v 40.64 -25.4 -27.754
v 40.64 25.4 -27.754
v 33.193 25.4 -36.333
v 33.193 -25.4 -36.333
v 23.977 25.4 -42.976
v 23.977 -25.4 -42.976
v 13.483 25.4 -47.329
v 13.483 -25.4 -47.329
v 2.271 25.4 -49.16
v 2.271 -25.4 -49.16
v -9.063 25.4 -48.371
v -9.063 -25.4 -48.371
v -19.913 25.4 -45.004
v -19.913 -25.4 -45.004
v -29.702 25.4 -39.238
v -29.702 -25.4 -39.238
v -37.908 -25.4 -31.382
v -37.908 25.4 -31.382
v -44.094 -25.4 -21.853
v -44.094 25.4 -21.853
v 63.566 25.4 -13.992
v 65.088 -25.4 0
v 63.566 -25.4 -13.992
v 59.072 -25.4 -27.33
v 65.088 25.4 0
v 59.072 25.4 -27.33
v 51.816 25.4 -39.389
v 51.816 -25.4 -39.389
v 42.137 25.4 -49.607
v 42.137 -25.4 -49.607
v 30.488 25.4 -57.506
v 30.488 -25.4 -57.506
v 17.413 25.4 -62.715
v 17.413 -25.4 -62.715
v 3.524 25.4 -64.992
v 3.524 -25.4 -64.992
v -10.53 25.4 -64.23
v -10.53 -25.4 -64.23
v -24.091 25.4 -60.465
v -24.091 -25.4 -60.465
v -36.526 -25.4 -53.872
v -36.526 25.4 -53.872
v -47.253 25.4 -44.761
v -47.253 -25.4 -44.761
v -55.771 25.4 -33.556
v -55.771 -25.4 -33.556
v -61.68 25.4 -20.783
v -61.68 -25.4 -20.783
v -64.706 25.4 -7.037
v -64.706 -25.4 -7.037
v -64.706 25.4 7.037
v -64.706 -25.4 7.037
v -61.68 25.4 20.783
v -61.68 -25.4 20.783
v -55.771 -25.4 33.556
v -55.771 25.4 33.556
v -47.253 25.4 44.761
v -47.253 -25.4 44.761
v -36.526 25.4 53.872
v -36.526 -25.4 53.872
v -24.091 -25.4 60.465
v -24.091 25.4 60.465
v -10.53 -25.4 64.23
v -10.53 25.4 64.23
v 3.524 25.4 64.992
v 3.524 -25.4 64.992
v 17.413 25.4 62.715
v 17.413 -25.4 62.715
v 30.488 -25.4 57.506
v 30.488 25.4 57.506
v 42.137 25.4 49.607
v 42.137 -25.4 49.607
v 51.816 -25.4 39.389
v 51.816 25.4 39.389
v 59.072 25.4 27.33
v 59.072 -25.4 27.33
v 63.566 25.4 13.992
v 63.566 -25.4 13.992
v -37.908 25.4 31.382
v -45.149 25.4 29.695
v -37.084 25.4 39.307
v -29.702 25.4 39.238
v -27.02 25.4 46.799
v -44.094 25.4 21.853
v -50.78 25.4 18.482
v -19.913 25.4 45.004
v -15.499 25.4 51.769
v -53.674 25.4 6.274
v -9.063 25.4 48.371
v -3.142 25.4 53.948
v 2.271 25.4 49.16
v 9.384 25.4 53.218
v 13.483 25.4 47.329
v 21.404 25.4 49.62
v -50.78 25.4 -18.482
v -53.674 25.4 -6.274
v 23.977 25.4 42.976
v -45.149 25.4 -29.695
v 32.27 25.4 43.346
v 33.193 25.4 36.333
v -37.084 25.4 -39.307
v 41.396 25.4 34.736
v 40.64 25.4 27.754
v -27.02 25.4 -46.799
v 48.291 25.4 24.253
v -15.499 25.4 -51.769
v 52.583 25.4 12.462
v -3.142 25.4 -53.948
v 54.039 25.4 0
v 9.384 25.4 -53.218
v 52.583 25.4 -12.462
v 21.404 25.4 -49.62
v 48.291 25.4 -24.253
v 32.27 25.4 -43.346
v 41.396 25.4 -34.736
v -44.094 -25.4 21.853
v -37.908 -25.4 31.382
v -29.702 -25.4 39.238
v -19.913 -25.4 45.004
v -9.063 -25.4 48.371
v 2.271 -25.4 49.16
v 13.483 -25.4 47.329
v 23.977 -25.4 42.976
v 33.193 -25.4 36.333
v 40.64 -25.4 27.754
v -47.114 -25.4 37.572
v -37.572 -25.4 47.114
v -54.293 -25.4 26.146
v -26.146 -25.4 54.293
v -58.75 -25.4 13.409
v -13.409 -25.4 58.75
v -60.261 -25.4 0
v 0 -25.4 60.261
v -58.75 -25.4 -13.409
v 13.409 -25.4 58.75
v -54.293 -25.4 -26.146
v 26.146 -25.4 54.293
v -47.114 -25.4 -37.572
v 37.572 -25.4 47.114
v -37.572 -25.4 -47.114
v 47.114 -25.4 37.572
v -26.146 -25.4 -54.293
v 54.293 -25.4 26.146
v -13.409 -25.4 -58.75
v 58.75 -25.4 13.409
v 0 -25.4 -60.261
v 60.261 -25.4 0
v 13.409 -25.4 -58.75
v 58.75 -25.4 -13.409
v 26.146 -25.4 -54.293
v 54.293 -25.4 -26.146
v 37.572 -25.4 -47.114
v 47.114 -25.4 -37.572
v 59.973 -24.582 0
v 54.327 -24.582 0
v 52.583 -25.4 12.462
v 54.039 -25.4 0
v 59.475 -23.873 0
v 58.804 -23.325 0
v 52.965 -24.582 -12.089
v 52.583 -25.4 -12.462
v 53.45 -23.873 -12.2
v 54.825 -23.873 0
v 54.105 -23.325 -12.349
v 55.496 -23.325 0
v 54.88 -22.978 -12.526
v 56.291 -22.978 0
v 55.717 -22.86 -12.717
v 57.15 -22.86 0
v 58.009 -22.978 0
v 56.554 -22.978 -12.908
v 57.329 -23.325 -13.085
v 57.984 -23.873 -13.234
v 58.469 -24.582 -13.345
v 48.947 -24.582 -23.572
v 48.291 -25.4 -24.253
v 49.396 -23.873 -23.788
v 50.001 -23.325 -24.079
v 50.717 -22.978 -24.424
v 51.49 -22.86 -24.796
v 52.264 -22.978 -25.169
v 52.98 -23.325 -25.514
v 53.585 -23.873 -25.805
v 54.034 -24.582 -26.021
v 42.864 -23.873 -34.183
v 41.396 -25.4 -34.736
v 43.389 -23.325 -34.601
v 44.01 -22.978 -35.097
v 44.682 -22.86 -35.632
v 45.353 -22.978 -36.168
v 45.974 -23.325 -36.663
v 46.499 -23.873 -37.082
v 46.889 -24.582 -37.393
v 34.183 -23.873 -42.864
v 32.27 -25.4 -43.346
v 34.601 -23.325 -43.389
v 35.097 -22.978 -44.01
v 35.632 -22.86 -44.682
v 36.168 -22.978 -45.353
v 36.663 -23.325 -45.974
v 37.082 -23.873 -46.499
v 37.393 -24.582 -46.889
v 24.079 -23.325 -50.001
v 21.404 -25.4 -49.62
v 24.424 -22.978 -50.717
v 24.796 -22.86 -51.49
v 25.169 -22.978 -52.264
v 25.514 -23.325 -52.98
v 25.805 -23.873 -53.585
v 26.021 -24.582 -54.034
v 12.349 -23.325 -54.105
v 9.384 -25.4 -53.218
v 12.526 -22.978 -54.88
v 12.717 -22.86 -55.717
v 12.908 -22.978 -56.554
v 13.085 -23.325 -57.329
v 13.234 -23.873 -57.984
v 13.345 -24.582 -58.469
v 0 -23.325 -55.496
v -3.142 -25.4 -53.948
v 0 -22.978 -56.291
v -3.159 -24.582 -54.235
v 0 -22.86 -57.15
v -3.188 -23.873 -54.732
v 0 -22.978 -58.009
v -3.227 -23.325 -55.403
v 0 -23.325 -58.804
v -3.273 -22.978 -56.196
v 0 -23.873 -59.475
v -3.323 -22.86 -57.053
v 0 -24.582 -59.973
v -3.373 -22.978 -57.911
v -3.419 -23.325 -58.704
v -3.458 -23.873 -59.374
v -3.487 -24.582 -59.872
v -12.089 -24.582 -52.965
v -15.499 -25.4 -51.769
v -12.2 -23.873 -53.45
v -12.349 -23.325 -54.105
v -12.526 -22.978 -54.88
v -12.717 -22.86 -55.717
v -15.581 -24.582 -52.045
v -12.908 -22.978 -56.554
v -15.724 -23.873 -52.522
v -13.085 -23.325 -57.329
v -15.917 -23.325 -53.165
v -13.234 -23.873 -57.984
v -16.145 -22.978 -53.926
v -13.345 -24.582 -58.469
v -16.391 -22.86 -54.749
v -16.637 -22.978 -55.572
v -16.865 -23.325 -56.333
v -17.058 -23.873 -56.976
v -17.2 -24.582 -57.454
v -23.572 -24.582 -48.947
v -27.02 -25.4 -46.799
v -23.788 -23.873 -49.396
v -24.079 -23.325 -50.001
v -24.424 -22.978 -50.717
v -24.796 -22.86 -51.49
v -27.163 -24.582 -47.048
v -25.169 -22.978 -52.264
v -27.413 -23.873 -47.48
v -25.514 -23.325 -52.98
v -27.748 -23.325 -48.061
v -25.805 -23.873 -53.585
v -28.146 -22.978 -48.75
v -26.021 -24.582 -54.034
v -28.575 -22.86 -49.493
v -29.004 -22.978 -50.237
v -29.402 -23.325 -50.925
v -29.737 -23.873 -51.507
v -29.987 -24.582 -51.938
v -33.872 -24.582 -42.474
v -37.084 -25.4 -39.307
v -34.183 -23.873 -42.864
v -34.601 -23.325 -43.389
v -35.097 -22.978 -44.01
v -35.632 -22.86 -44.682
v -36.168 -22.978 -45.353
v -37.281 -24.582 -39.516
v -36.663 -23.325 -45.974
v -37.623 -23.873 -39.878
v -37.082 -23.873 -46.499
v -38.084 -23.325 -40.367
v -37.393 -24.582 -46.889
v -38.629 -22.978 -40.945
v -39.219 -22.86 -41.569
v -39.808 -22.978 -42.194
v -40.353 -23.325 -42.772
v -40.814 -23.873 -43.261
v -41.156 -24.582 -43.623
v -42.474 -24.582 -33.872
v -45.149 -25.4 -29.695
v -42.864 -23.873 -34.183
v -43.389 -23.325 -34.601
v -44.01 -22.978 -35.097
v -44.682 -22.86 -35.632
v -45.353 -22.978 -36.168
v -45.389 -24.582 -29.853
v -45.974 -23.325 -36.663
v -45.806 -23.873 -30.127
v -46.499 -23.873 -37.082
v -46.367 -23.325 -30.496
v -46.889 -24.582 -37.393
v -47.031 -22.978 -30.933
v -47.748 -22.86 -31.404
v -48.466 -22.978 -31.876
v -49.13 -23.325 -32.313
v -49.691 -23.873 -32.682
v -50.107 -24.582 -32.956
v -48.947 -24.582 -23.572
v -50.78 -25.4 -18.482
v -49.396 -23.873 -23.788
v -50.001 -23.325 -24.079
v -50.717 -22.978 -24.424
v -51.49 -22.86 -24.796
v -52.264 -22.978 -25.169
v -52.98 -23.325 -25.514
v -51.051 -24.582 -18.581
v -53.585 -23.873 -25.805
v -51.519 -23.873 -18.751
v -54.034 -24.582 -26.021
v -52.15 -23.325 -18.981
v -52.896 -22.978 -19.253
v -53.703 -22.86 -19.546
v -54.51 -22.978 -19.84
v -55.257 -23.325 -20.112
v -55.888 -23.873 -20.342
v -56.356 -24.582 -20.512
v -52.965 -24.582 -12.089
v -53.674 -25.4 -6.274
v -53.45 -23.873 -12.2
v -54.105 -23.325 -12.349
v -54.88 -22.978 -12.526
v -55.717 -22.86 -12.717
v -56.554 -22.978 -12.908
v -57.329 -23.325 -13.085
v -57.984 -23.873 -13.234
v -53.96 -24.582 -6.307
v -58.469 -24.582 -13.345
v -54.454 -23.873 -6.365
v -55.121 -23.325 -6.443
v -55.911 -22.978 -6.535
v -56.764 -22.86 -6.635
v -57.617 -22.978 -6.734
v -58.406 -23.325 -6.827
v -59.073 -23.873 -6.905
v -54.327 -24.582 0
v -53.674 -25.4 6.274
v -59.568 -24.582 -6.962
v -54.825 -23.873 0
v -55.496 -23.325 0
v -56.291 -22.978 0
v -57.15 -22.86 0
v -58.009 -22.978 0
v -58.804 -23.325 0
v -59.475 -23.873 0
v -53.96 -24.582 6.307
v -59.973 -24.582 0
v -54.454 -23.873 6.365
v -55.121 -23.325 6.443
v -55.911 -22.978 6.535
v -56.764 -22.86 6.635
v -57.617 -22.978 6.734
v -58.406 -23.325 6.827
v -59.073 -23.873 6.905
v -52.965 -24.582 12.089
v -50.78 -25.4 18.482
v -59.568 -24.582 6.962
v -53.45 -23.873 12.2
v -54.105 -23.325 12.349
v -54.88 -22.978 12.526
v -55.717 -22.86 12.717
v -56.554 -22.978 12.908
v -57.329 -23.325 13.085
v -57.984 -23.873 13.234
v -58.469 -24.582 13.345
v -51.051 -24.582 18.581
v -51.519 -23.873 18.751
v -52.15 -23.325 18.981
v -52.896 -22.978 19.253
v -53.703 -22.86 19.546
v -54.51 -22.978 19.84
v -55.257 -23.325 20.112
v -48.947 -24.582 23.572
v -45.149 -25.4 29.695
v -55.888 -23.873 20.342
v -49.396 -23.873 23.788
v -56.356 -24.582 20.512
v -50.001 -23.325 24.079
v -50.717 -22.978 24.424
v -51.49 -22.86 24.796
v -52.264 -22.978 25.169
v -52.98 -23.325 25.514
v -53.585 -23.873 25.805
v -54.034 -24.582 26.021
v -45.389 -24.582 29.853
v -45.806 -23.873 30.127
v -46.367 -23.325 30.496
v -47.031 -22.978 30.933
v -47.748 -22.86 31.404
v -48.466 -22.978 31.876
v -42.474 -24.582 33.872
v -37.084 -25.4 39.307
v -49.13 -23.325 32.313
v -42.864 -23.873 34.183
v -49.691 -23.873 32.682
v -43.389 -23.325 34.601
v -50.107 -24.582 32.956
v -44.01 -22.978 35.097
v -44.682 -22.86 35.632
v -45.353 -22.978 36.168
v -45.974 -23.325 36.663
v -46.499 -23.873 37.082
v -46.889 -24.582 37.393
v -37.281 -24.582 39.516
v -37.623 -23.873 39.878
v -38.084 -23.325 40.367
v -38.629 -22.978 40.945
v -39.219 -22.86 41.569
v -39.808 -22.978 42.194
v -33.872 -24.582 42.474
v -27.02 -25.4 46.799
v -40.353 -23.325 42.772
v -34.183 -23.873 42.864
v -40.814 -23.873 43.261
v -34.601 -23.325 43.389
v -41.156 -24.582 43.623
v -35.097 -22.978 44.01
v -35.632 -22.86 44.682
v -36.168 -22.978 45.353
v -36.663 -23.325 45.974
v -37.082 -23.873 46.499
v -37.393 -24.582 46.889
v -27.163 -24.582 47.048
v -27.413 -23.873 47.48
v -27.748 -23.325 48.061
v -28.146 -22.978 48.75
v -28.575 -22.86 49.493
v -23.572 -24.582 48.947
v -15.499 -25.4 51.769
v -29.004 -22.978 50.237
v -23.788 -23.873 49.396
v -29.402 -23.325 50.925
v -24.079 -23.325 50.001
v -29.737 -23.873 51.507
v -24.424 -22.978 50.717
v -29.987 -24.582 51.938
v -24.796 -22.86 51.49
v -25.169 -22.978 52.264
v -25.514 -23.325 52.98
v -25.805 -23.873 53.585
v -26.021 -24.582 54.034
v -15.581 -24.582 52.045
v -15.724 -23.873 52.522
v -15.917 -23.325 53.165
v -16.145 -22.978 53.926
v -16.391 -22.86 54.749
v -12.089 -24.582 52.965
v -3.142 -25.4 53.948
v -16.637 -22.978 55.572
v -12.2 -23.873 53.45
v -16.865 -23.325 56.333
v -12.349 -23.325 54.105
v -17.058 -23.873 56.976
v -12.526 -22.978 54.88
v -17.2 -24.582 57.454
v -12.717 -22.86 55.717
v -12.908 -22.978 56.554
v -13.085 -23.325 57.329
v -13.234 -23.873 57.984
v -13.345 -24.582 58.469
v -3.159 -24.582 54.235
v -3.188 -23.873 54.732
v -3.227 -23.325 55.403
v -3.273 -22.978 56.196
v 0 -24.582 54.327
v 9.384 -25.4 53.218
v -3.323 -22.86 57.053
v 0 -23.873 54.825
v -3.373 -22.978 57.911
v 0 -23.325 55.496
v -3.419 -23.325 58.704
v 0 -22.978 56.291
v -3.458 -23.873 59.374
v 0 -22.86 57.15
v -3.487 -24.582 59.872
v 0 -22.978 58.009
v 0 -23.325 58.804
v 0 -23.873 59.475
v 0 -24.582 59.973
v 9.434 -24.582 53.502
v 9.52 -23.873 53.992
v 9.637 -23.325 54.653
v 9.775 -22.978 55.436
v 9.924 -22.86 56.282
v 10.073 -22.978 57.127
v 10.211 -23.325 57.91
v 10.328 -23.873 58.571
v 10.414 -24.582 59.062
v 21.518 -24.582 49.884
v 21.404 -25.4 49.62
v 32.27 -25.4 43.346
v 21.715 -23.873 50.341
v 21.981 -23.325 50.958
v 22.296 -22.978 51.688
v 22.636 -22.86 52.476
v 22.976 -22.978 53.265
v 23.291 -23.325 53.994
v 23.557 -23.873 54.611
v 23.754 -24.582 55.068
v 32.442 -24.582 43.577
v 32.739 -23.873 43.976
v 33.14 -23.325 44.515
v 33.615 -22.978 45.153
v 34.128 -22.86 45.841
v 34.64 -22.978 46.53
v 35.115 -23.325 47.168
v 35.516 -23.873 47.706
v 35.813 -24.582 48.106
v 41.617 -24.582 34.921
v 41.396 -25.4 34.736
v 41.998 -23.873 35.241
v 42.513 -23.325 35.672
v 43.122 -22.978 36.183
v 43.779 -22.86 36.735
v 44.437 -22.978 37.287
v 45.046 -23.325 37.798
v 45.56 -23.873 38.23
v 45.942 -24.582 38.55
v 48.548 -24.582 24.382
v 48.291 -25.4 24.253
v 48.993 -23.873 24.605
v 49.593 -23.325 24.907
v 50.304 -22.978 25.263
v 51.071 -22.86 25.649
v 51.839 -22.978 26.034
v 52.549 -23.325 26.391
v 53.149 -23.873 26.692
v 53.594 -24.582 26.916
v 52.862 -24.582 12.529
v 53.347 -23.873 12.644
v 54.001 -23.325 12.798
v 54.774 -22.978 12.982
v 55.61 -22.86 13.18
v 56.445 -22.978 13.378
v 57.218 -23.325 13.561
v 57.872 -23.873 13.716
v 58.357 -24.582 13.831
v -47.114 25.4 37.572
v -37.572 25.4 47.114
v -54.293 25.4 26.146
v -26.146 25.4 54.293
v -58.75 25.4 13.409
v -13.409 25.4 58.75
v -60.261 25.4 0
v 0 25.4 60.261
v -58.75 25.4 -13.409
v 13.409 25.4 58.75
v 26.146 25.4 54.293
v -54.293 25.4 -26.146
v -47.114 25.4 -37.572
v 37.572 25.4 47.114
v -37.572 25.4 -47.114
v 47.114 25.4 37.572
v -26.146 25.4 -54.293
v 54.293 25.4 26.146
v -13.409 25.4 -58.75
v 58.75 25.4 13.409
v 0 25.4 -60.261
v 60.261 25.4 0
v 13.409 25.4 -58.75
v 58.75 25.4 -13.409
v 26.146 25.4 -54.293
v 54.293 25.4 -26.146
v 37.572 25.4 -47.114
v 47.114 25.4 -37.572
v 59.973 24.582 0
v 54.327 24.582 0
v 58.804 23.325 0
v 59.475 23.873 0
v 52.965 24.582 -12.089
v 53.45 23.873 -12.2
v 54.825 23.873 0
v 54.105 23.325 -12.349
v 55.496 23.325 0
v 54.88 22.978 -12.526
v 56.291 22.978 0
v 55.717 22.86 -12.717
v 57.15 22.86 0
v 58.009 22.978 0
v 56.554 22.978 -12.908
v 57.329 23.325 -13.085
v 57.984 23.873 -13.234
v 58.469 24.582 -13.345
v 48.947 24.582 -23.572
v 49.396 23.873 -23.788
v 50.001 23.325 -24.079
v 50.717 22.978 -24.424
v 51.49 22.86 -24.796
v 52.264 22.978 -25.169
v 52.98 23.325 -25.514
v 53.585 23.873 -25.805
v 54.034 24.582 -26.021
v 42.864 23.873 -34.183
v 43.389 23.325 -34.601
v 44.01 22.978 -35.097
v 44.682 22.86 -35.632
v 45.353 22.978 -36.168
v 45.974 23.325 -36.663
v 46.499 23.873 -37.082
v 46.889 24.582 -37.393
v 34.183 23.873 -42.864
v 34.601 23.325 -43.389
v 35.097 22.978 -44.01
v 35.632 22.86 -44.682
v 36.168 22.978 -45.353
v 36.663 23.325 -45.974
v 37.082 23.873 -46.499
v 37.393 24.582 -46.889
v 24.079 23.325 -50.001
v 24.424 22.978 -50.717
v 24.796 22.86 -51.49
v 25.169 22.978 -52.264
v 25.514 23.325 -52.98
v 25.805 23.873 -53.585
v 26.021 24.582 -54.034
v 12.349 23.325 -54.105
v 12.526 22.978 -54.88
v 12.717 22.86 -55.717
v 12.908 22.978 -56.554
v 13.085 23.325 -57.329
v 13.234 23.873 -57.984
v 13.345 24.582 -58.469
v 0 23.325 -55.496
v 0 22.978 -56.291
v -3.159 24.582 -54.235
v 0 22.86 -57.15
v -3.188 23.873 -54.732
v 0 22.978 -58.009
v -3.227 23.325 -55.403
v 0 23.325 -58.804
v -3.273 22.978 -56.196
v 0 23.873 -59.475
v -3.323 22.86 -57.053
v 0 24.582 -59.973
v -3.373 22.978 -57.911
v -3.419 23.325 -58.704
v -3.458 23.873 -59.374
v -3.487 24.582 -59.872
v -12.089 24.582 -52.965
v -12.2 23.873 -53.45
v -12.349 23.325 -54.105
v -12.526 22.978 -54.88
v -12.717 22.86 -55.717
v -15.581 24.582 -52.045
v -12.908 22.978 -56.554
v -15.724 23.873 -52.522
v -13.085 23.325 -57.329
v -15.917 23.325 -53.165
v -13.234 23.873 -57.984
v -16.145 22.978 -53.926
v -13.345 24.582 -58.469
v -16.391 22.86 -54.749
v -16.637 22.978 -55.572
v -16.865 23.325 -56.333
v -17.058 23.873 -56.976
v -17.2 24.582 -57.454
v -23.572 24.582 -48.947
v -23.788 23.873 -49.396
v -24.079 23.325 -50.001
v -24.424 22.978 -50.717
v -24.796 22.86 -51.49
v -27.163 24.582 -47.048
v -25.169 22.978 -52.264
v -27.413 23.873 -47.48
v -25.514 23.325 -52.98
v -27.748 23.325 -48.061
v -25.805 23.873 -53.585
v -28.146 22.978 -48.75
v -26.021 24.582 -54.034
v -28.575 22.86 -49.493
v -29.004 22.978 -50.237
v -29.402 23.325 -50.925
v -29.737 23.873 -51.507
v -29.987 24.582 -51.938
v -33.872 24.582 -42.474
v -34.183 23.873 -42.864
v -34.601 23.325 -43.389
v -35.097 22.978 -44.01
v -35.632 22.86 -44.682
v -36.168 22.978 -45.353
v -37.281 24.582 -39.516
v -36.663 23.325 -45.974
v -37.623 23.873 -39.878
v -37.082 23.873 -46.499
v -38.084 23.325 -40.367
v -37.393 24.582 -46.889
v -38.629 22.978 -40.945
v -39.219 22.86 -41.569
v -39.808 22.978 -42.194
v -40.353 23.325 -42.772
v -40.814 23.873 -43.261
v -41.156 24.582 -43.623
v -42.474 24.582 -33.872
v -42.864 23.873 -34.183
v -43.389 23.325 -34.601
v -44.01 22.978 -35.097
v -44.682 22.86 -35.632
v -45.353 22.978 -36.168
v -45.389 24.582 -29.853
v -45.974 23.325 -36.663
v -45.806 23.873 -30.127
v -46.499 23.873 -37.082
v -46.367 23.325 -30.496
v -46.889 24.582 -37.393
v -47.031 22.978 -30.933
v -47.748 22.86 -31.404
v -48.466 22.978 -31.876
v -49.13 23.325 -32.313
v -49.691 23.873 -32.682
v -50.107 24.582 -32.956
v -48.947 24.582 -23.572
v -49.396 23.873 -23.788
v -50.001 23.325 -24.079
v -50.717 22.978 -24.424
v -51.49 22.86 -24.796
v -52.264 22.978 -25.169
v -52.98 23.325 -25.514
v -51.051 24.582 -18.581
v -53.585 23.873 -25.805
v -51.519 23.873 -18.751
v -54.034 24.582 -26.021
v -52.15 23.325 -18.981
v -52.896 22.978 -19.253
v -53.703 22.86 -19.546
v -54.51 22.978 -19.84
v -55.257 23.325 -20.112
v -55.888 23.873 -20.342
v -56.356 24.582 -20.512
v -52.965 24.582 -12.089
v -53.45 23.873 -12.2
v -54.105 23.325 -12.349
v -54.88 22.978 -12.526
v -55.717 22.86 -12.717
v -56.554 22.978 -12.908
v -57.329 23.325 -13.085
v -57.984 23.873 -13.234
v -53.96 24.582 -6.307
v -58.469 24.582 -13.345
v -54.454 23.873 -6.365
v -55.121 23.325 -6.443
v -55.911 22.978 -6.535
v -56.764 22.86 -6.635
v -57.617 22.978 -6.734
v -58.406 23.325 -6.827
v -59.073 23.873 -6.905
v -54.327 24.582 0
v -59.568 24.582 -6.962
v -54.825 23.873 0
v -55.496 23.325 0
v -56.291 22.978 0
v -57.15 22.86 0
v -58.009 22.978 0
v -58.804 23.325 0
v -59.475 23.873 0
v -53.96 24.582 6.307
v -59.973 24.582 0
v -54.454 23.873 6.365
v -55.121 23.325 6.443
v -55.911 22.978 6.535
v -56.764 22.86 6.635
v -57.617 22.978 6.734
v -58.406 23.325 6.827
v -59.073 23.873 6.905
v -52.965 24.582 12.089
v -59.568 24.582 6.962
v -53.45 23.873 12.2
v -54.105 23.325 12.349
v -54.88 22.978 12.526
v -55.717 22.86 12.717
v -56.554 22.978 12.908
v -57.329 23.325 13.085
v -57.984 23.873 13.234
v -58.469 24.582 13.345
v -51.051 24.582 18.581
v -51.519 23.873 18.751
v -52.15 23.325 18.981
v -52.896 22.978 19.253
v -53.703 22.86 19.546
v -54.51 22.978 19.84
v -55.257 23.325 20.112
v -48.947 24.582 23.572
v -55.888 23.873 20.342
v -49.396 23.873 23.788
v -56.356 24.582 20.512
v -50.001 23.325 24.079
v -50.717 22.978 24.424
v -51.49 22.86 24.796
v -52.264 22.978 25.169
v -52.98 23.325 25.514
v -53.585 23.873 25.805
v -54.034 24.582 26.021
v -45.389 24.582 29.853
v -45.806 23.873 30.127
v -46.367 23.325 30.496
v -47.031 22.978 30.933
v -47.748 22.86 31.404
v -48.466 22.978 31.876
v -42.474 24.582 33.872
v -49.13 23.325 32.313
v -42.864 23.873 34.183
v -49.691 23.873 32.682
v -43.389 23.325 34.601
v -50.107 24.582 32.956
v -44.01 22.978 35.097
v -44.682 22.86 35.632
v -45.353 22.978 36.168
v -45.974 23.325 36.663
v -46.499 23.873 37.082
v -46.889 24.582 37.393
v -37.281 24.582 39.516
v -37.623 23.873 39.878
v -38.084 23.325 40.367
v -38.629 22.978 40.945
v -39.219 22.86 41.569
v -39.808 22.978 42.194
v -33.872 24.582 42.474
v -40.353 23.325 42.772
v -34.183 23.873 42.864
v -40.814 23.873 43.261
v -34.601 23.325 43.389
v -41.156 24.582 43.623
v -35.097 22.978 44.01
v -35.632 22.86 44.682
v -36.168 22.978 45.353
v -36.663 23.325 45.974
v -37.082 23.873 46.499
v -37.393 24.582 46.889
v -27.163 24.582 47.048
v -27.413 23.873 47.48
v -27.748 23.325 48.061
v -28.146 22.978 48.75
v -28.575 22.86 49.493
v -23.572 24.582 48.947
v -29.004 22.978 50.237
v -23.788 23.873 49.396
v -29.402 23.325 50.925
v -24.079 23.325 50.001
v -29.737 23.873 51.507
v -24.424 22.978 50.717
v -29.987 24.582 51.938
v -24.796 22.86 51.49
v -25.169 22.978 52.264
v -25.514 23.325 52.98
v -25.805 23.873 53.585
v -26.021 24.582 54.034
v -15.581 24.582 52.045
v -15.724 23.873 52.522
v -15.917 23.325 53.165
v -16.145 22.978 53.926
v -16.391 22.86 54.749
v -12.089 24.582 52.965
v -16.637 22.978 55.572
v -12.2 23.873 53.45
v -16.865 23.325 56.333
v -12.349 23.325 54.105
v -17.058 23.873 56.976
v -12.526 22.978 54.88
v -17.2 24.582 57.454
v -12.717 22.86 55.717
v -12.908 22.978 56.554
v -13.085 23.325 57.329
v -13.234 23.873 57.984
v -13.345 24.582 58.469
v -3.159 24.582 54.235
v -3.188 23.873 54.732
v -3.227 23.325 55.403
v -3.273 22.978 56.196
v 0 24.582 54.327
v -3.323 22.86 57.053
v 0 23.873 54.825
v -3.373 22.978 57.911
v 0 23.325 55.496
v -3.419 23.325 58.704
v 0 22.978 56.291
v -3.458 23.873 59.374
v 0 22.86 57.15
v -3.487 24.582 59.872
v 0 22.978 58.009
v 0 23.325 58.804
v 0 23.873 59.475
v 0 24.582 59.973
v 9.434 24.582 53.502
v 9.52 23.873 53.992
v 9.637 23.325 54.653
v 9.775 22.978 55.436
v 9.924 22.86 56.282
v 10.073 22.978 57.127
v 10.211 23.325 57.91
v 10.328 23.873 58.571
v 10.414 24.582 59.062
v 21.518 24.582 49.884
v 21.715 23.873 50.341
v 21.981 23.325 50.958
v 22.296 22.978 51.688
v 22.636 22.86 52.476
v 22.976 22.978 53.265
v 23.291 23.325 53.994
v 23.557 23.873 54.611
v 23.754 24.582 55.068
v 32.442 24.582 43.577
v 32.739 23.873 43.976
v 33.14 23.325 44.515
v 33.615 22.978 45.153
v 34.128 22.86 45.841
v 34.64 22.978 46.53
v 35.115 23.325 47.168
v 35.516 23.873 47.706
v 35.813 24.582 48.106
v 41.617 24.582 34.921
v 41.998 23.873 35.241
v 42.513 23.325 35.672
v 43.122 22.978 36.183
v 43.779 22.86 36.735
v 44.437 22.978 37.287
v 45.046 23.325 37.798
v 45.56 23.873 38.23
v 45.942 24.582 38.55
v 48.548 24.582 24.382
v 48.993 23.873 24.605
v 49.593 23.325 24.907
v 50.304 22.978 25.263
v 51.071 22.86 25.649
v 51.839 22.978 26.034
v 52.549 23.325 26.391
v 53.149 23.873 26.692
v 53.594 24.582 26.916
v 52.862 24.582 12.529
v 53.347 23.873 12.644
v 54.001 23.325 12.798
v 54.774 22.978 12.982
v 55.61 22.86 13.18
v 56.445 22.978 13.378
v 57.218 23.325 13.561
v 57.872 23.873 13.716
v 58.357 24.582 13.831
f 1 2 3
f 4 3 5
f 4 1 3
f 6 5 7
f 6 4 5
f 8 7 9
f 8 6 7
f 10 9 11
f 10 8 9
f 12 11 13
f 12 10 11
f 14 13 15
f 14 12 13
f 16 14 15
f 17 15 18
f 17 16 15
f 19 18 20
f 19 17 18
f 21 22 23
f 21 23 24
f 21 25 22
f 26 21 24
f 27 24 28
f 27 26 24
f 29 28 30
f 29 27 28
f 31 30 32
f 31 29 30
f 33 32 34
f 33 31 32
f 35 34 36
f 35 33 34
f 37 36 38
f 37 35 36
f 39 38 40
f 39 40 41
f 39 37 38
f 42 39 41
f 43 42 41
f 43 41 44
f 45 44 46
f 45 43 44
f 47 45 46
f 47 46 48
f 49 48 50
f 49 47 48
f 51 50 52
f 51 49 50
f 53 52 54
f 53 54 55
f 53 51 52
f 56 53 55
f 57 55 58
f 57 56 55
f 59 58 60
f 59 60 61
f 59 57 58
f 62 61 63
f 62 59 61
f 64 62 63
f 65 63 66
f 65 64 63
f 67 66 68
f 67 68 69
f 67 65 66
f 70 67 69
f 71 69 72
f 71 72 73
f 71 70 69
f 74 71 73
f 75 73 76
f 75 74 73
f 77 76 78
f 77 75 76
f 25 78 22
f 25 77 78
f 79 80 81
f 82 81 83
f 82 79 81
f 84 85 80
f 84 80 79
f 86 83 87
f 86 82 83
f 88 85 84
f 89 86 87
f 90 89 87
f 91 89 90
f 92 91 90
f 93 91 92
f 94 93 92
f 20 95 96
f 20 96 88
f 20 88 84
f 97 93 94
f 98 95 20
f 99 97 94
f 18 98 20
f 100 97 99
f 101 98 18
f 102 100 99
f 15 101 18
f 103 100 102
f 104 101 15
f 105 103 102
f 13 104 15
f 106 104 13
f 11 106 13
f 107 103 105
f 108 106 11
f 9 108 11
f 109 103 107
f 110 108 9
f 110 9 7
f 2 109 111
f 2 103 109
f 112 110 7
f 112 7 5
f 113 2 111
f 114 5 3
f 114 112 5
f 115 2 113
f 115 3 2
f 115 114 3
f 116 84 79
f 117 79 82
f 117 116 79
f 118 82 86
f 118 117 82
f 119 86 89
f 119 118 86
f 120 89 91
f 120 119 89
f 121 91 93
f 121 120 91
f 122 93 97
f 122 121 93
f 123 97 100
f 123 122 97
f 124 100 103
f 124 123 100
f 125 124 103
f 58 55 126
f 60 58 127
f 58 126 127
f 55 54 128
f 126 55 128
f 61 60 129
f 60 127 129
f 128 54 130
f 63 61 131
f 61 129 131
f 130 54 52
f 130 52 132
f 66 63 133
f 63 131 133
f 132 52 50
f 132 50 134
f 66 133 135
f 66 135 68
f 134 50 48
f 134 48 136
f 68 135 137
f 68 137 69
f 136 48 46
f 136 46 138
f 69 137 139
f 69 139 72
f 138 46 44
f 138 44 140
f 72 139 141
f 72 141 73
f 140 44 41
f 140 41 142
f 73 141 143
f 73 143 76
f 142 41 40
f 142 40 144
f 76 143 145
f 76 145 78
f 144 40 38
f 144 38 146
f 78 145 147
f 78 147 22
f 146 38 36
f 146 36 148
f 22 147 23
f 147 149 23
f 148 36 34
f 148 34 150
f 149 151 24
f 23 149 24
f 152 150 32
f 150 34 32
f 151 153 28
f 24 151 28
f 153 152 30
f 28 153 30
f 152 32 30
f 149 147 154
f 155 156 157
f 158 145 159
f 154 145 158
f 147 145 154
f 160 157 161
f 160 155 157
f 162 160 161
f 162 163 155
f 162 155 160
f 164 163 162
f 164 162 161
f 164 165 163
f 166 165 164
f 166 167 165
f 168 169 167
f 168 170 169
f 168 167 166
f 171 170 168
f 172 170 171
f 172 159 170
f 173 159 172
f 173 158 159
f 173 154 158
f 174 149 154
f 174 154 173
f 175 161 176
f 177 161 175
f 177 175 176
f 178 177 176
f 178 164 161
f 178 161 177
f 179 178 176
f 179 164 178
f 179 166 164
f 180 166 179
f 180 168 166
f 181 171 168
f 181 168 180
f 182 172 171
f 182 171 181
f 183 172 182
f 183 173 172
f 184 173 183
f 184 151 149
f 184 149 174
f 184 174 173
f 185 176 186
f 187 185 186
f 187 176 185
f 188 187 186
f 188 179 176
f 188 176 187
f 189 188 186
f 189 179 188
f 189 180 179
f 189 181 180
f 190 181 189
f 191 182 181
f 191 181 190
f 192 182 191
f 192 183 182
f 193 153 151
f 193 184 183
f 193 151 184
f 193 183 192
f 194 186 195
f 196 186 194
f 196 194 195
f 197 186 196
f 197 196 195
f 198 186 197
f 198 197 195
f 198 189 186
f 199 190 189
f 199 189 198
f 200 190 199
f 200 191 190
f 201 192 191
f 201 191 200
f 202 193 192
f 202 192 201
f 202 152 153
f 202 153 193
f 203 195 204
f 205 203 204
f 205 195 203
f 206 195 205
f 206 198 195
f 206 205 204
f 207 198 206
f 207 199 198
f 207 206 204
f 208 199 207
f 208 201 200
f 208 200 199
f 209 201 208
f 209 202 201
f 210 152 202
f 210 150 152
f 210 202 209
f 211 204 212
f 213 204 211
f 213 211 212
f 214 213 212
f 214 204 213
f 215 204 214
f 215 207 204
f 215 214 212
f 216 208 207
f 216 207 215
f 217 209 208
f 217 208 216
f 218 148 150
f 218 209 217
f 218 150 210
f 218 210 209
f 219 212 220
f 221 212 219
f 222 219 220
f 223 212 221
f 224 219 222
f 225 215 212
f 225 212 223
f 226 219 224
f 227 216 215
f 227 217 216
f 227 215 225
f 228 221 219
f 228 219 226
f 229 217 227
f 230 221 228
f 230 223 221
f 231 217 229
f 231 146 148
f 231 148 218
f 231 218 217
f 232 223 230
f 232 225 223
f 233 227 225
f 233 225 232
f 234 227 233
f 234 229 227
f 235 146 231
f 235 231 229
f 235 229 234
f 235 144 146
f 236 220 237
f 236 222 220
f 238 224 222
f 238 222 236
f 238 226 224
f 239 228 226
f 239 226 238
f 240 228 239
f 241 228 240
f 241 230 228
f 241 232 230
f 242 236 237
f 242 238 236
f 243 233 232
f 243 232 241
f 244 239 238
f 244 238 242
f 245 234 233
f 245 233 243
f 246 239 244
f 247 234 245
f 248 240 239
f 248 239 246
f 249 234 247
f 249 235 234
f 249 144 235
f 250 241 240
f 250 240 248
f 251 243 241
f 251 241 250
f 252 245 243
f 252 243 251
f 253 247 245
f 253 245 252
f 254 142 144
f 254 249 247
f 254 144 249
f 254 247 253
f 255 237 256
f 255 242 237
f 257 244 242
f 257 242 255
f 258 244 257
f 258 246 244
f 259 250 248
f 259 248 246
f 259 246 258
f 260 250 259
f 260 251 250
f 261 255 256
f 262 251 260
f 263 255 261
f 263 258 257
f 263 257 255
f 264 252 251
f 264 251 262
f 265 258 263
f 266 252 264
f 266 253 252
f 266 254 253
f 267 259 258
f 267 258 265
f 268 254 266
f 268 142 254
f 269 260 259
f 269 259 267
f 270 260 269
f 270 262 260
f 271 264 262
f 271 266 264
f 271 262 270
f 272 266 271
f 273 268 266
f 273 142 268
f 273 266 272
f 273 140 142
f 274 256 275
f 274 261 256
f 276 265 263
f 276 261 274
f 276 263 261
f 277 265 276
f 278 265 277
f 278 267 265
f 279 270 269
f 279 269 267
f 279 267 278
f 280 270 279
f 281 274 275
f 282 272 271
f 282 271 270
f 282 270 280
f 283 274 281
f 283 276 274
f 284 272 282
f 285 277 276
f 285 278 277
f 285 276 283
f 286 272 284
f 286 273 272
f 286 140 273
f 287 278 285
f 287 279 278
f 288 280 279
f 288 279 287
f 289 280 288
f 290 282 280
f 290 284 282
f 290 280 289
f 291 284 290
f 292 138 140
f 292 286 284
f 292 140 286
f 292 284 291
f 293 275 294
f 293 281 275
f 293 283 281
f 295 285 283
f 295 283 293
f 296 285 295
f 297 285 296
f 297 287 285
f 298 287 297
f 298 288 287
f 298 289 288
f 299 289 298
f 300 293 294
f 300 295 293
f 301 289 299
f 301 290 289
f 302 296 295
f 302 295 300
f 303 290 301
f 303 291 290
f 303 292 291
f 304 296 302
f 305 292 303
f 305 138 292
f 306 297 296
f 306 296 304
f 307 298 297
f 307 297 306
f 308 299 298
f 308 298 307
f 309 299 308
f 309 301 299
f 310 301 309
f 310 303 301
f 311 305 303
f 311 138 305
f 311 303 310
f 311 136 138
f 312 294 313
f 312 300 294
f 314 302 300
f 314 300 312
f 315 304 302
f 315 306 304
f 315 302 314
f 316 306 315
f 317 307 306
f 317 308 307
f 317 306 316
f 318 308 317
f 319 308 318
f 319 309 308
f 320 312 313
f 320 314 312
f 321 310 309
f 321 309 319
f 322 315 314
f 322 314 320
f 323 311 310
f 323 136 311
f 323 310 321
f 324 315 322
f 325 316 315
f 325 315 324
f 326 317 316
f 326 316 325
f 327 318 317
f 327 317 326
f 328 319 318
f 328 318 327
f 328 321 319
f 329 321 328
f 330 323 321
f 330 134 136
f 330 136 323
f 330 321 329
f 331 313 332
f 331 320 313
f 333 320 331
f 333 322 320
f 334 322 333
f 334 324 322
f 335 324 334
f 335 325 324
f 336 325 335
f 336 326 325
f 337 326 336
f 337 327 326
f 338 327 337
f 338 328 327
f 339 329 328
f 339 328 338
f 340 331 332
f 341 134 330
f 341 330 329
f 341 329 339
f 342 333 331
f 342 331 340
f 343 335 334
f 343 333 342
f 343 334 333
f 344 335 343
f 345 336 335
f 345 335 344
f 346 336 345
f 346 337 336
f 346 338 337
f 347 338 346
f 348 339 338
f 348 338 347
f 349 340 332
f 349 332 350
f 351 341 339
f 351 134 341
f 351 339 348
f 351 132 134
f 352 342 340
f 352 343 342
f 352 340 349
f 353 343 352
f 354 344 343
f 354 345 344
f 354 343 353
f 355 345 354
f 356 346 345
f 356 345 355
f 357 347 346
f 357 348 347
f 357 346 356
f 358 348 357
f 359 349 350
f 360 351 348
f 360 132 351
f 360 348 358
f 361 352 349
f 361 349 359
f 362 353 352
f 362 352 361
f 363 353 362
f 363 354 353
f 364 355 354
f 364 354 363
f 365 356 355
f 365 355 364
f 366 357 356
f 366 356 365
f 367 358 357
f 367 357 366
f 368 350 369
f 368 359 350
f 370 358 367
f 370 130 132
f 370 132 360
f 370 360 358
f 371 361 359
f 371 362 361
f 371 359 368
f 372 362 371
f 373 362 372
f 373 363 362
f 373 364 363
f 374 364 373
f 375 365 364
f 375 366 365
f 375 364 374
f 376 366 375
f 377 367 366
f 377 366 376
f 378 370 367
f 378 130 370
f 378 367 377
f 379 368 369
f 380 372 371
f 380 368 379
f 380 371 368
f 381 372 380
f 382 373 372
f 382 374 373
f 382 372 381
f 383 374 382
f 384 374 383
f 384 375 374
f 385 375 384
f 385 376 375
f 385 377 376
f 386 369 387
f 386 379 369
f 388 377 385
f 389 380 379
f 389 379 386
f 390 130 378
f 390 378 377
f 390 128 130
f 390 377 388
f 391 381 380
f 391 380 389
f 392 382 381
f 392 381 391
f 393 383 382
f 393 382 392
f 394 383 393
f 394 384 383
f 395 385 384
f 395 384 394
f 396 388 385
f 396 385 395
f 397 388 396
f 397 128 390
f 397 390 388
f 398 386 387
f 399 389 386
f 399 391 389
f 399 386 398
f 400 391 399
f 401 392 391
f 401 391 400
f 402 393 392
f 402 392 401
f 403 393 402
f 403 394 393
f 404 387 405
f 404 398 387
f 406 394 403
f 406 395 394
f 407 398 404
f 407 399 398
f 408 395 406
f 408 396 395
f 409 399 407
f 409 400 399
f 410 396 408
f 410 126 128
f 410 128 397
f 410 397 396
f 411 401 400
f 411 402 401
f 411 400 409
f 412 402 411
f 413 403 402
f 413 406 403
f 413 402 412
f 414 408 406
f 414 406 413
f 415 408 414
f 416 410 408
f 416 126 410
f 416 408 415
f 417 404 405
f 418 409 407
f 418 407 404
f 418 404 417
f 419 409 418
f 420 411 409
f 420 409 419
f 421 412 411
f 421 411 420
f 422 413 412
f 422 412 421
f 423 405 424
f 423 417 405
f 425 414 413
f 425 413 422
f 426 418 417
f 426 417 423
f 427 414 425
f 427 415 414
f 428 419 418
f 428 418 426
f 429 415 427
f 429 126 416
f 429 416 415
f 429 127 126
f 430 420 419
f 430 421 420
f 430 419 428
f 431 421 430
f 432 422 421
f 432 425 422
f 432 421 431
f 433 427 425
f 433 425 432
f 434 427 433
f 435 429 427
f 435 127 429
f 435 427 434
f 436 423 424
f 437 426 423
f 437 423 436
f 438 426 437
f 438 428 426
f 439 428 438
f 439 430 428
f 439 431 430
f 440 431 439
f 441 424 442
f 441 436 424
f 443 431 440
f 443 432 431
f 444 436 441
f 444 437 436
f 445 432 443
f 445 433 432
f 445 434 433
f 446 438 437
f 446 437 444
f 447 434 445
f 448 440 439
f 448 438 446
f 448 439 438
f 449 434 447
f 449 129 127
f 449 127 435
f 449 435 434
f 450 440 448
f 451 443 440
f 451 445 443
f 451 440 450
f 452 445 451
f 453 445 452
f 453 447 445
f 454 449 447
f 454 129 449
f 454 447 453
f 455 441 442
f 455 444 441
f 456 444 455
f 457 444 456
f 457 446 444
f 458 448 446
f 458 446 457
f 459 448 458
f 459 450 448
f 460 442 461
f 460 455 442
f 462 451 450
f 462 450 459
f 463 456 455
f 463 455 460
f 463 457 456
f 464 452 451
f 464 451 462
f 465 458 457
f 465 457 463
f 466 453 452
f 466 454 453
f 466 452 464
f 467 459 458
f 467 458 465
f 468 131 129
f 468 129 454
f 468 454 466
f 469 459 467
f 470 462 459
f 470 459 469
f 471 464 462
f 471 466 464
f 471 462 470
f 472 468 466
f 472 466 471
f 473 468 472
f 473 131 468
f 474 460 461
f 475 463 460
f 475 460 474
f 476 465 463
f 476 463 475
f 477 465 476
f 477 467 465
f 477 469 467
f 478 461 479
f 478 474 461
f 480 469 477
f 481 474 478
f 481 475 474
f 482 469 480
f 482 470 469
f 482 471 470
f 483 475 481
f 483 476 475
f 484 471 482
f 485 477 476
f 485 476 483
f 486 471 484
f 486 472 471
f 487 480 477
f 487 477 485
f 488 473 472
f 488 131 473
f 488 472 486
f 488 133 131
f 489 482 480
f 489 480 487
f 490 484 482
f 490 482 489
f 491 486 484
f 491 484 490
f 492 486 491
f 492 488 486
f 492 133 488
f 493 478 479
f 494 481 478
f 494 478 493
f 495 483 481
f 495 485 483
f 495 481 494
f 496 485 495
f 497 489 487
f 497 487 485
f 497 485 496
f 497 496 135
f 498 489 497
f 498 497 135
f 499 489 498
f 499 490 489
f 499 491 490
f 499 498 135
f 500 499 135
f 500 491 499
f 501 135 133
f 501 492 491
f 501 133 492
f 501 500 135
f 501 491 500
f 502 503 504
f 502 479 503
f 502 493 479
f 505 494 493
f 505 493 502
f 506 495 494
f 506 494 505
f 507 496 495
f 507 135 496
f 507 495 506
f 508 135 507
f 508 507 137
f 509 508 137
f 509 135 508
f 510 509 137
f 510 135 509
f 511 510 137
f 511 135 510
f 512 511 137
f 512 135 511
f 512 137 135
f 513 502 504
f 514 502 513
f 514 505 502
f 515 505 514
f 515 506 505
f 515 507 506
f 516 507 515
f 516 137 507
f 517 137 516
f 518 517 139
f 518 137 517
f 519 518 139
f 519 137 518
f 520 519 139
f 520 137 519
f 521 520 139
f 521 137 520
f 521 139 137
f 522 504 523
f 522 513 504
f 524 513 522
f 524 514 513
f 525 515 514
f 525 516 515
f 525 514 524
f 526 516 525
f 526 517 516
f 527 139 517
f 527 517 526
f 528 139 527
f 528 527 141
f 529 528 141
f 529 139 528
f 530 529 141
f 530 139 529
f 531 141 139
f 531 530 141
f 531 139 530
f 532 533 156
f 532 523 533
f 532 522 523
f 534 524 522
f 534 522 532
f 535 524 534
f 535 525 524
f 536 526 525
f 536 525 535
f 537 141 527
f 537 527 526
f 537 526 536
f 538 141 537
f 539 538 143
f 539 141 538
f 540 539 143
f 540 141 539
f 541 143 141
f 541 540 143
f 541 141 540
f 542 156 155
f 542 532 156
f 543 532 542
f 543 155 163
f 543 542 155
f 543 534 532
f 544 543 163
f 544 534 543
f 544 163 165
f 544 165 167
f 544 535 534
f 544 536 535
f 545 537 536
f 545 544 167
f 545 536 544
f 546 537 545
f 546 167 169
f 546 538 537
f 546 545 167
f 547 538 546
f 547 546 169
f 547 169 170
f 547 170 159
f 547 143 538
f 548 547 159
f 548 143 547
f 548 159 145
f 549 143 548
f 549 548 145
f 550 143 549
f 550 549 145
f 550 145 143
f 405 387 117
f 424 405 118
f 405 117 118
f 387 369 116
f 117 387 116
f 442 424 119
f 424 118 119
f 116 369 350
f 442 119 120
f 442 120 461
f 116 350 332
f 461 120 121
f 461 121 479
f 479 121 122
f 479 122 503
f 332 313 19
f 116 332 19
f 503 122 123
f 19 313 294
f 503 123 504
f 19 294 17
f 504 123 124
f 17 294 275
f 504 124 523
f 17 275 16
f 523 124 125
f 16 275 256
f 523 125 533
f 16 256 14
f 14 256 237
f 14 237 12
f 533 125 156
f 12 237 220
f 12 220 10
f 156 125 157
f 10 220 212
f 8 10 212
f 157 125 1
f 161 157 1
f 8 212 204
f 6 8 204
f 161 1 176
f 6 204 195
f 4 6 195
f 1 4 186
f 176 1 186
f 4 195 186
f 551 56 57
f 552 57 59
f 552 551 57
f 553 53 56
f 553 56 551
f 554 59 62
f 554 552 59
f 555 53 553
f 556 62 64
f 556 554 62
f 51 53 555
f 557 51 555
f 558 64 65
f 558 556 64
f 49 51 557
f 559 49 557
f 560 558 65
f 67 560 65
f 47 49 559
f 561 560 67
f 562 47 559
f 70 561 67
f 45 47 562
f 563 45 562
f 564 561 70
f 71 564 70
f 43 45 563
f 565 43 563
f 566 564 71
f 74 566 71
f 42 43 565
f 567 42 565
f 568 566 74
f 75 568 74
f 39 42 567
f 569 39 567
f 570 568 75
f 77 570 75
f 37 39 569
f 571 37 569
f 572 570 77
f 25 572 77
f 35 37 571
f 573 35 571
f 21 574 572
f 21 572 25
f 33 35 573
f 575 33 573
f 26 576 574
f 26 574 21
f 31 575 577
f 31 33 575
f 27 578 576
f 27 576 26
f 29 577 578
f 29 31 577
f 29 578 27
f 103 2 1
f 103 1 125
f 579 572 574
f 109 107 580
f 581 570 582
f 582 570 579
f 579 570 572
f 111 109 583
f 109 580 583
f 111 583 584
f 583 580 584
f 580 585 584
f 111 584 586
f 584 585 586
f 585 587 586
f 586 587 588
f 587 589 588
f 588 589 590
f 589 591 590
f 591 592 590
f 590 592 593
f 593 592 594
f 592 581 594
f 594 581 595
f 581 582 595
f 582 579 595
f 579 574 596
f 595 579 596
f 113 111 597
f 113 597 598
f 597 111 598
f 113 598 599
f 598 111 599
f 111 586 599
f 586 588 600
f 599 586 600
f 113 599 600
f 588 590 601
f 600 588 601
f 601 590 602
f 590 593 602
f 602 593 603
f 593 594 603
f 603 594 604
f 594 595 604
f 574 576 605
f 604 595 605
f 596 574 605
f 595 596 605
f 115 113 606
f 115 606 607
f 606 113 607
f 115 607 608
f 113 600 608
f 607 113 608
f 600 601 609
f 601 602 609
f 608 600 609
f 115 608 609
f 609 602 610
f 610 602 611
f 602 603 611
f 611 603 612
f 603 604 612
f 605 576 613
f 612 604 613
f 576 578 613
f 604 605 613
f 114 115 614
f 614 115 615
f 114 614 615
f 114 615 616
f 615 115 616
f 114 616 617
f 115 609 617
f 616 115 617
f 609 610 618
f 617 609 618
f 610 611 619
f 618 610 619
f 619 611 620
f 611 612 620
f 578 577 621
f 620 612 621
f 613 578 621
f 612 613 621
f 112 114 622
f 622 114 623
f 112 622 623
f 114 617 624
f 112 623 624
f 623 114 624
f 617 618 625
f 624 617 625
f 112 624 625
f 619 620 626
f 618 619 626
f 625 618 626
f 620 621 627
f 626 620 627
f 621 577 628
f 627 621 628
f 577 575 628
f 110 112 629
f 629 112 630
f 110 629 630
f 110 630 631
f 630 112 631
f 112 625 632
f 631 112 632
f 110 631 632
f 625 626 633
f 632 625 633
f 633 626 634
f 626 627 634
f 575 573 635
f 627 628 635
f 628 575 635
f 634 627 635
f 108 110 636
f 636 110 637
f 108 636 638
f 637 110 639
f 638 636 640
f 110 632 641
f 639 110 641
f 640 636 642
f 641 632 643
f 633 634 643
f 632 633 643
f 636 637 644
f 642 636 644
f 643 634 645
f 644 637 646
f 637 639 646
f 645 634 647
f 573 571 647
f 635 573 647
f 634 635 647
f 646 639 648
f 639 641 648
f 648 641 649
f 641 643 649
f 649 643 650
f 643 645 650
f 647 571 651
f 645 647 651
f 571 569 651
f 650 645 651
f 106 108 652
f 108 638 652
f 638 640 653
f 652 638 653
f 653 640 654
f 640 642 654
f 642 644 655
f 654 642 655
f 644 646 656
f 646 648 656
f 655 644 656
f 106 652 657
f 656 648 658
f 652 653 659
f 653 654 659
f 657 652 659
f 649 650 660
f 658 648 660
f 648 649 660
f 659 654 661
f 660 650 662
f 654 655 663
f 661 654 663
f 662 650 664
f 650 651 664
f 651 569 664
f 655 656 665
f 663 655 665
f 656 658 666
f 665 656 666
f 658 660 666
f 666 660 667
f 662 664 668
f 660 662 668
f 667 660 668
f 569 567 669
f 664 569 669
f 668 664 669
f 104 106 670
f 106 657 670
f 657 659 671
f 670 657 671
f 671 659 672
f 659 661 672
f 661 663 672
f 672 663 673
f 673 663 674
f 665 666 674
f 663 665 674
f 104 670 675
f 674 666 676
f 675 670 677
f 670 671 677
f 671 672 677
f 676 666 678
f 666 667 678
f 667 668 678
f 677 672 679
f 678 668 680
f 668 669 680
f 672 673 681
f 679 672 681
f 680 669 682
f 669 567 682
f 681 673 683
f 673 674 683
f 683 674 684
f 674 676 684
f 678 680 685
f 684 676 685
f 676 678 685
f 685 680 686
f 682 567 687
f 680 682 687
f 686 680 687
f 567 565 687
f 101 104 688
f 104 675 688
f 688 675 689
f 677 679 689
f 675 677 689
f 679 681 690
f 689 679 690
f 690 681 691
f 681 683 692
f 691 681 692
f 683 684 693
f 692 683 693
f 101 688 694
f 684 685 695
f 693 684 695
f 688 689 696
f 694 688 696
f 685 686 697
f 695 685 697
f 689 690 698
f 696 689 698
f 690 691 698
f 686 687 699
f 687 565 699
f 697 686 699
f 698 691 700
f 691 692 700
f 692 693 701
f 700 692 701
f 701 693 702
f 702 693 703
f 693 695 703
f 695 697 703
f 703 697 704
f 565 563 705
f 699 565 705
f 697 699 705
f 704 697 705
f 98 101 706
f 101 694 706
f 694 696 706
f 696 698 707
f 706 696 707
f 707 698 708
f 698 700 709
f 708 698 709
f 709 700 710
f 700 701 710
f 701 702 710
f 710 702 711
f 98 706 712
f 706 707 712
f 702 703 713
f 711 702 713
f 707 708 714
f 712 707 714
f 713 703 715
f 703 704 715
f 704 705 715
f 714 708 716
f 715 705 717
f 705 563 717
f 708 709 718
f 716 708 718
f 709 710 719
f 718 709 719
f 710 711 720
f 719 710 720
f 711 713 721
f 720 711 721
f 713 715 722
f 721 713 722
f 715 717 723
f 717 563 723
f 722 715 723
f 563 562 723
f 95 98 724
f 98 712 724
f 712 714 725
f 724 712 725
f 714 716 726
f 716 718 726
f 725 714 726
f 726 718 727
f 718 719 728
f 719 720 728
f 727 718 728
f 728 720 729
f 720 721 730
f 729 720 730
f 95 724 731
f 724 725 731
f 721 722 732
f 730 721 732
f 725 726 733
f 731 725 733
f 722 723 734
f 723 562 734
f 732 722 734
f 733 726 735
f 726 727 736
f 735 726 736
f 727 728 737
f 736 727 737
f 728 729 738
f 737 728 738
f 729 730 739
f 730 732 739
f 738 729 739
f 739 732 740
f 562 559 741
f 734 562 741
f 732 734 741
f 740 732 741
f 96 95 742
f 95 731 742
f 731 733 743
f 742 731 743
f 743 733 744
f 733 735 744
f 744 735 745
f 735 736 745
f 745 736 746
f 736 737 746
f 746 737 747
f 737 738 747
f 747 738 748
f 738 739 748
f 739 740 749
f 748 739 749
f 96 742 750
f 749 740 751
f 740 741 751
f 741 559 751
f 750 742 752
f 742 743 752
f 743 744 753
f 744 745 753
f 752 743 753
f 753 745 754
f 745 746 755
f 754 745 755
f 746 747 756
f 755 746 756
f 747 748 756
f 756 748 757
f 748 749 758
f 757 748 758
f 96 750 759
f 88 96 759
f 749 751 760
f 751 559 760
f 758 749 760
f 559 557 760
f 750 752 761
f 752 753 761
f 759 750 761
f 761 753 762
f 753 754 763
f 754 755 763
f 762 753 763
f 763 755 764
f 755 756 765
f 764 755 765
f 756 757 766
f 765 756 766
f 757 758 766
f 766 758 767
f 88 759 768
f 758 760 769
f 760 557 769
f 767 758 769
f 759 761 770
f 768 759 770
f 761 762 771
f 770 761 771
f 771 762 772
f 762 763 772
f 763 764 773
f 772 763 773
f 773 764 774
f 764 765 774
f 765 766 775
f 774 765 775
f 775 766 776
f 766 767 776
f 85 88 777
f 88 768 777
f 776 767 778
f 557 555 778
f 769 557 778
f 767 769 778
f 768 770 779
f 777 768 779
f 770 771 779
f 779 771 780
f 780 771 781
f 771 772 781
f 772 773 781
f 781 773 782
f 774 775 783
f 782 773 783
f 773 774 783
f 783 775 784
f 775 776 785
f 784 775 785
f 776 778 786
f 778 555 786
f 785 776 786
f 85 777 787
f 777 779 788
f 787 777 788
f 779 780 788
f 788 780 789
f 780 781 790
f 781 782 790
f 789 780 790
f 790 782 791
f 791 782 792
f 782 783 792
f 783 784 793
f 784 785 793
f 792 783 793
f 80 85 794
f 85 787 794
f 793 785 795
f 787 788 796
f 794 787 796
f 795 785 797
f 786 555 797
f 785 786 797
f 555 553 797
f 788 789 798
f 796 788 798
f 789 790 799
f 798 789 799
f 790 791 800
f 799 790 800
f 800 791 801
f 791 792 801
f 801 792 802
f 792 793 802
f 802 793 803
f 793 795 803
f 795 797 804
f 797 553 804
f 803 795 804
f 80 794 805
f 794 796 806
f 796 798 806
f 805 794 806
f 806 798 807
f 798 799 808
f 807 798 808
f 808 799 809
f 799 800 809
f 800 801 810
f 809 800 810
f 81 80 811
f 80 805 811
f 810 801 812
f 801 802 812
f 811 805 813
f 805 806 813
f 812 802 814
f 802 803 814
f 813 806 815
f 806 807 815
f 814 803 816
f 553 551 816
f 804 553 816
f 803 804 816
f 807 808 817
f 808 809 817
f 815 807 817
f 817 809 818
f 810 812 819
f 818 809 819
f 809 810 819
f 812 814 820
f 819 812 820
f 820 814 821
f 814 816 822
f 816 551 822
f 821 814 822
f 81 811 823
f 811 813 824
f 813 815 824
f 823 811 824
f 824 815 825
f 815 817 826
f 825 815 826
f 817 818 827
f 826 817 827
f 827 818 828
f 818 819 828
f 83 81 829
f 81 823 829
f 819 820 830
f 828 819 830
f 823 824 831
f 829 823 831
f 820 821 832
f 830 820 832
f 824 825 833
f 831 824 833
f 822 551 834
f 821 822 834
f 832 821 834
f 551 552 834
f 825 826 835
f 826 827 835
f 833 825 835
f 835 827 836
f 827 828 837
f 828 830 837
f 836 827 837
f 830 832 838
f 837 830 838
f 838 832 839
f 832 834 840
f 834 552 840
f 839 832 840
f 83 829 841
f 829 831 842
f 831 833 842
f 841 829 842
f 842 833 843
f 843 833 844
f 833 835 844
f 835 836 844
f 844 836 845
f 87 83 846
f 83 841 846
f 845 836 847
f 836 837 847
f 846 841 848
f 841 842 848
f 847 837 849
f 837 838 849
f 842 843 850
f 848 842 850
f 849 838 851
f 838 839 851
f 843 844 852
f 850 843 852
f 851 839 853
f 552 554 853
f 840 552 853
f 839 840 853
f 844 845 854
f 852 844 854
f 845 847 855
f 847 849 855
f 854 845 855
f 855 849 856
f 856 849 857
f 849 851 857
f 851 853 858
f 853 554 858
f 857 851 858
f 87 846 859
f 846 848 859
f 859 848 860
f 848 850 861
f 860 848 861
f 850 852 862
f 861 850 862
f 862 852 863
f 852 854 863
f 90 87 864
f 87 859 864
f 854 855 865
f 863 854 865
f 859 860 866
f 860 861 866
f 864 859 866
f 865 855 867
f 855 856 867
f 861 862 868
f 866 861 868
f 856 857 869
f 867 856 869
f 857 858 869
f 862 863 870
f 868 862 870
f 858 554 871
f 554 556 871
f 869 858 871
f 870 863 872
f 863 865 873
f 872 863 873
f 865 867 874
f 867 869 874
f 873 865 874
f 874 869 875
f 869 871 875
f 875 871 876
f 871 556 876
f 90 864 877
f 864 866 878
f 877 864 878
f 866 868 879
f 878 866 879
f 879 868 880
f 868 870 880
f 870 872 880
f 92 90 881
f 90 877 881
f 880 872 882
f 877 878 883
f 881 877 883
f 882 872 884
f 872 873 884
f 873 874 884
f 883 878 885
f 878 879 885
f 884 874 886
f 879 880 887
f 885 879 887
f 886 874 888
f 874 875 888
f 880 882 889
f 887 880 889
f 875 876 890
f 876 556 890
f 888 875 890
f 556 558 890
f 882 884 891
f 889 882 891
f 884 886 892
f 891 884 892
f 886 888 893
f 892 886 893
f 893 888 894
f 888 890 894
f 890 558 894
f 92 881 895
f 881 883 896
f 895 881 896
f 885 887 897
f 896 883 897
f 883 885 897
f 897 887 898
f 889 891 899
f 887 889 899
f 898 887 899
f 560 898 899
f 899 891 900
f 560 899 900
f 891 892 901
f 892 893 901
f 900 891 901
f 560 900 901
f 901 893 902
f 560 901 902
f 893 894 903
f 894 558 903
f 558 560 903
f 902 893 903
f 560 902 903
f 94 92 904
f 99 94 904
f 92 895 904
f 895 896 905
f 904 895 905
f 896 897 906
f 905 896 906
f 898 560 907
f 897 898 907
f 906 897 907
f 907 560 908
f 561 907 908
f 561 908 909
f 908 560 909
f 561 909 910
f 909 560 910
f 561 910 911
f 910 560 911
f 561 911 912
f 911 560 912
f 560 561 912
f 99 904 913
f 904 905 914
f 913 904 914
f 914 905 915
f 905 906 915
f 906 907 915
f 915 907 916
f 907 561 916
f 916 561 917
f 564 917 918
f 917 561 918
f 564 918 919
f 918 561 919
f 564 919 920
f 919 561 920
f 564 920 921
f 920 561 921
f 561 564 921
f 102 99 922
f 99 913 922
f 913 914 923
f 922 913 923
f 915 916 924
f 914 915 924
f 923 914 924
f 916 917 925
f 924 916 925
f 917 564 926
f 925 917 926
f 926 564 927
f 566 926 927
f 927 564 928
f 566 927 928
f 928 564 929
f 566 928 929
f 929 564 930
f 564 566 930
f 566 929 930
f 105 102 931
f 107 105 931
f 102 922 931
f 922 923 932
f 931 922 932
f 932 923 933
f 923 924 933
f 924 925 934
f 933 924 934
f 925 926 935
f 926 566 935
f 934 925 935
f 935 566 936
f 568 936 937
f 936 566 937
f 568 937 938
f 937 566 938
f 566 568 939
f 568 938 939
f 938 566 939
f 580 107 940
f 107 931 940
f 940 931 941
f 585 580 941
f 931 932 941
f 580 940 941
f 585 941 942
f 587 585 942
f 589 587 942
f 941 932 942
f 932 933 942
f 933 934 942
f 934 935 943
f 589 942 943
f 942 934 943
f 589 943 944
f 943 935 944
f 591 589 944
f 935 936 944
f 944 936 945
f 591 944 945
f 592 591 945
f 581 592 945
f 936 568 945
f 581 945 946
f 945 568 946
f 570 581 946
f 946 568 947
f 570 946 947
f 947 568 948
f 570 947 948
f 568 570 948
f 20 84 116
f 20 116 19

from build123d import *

# Parameters (mm, degrees)
SKETCH1_R           = 65.0875
SKETCH1_R_2         = 49.2125
BOSS_EXTRUDE1_DEPTH = 25.4
SKETCH11_R          = 3.175
BOSS_EXTRUDE2_DEPTH = 50.8
BOSS_EXTRUDE4_DEPTH = 50.8


with BuildPart() as part:
    # Sketch1 → Boss-Extrude1 (new body, symmetric)
    with BuildSketch(Plane(origin=(0, 0, 0), x_dir=(1, 0, 0), z_dir=(0, 1, 0))):
        Circle(SKETCH1_R)
        Circle(SKETCH1_R_2, mode=Mode.SUBTRACT)
    extrude(amount=BOSS_EXTRUDE1_DEPTH, both=True)

    # Sketch11 → Cut-Revolve1 (revolve, cut)
    with BuildSketch(Plane.XY):
        with Locations((57.15, 26.035)):
            Circle(SKETCH11_R)
    cut_revolve1 = revolve(axis=Axis((0, 0, 0), (0, 1, 0)), mode=Mode.SUBTRACT)

    # Mirror1: Cut-Revolve1 across plane
    add(cut_revolve1.mirror(Plane.ZX), mode=Mode.SUBTRACT)

    # Sketch3 → Boss-Extrude2 (add, through all)
    with BuildSketch(Plane(origin=(0, 25.4, 0), x_dir=(1, 0, 0), z_dir=(0, 1, 0))):
        with BuildLine():
            Line((-44.0944, -21.853009973), (-44.0944, 21.853009973))
            ThreePointArc((-44.0944, 21.853009973), (-49.2125, 0), (-44.0944, -21.853009973))
        make_face()
    extrude(amount=-BOSS_EXTRUDE2_DEPTH)

    # Sketch6 → Boss-Extrude4 (add, through all)
    with BuildSketch(Plane(origin=(0, 25.4, 0), x_dir=(1, 0, 0), z_dir=(0, 1, 0))):
        with BuildLine():
            Line((40.64, 27.753568352), (40.64, -27.753568352))
            ThreePointArc((40.64, -27.753568352), (49.2125, 0), (40.64, 27.753568352))
        make_face()
    extrude(amount=-BOSS_EXTRUDE4_DEPTH)


solid = part.part
